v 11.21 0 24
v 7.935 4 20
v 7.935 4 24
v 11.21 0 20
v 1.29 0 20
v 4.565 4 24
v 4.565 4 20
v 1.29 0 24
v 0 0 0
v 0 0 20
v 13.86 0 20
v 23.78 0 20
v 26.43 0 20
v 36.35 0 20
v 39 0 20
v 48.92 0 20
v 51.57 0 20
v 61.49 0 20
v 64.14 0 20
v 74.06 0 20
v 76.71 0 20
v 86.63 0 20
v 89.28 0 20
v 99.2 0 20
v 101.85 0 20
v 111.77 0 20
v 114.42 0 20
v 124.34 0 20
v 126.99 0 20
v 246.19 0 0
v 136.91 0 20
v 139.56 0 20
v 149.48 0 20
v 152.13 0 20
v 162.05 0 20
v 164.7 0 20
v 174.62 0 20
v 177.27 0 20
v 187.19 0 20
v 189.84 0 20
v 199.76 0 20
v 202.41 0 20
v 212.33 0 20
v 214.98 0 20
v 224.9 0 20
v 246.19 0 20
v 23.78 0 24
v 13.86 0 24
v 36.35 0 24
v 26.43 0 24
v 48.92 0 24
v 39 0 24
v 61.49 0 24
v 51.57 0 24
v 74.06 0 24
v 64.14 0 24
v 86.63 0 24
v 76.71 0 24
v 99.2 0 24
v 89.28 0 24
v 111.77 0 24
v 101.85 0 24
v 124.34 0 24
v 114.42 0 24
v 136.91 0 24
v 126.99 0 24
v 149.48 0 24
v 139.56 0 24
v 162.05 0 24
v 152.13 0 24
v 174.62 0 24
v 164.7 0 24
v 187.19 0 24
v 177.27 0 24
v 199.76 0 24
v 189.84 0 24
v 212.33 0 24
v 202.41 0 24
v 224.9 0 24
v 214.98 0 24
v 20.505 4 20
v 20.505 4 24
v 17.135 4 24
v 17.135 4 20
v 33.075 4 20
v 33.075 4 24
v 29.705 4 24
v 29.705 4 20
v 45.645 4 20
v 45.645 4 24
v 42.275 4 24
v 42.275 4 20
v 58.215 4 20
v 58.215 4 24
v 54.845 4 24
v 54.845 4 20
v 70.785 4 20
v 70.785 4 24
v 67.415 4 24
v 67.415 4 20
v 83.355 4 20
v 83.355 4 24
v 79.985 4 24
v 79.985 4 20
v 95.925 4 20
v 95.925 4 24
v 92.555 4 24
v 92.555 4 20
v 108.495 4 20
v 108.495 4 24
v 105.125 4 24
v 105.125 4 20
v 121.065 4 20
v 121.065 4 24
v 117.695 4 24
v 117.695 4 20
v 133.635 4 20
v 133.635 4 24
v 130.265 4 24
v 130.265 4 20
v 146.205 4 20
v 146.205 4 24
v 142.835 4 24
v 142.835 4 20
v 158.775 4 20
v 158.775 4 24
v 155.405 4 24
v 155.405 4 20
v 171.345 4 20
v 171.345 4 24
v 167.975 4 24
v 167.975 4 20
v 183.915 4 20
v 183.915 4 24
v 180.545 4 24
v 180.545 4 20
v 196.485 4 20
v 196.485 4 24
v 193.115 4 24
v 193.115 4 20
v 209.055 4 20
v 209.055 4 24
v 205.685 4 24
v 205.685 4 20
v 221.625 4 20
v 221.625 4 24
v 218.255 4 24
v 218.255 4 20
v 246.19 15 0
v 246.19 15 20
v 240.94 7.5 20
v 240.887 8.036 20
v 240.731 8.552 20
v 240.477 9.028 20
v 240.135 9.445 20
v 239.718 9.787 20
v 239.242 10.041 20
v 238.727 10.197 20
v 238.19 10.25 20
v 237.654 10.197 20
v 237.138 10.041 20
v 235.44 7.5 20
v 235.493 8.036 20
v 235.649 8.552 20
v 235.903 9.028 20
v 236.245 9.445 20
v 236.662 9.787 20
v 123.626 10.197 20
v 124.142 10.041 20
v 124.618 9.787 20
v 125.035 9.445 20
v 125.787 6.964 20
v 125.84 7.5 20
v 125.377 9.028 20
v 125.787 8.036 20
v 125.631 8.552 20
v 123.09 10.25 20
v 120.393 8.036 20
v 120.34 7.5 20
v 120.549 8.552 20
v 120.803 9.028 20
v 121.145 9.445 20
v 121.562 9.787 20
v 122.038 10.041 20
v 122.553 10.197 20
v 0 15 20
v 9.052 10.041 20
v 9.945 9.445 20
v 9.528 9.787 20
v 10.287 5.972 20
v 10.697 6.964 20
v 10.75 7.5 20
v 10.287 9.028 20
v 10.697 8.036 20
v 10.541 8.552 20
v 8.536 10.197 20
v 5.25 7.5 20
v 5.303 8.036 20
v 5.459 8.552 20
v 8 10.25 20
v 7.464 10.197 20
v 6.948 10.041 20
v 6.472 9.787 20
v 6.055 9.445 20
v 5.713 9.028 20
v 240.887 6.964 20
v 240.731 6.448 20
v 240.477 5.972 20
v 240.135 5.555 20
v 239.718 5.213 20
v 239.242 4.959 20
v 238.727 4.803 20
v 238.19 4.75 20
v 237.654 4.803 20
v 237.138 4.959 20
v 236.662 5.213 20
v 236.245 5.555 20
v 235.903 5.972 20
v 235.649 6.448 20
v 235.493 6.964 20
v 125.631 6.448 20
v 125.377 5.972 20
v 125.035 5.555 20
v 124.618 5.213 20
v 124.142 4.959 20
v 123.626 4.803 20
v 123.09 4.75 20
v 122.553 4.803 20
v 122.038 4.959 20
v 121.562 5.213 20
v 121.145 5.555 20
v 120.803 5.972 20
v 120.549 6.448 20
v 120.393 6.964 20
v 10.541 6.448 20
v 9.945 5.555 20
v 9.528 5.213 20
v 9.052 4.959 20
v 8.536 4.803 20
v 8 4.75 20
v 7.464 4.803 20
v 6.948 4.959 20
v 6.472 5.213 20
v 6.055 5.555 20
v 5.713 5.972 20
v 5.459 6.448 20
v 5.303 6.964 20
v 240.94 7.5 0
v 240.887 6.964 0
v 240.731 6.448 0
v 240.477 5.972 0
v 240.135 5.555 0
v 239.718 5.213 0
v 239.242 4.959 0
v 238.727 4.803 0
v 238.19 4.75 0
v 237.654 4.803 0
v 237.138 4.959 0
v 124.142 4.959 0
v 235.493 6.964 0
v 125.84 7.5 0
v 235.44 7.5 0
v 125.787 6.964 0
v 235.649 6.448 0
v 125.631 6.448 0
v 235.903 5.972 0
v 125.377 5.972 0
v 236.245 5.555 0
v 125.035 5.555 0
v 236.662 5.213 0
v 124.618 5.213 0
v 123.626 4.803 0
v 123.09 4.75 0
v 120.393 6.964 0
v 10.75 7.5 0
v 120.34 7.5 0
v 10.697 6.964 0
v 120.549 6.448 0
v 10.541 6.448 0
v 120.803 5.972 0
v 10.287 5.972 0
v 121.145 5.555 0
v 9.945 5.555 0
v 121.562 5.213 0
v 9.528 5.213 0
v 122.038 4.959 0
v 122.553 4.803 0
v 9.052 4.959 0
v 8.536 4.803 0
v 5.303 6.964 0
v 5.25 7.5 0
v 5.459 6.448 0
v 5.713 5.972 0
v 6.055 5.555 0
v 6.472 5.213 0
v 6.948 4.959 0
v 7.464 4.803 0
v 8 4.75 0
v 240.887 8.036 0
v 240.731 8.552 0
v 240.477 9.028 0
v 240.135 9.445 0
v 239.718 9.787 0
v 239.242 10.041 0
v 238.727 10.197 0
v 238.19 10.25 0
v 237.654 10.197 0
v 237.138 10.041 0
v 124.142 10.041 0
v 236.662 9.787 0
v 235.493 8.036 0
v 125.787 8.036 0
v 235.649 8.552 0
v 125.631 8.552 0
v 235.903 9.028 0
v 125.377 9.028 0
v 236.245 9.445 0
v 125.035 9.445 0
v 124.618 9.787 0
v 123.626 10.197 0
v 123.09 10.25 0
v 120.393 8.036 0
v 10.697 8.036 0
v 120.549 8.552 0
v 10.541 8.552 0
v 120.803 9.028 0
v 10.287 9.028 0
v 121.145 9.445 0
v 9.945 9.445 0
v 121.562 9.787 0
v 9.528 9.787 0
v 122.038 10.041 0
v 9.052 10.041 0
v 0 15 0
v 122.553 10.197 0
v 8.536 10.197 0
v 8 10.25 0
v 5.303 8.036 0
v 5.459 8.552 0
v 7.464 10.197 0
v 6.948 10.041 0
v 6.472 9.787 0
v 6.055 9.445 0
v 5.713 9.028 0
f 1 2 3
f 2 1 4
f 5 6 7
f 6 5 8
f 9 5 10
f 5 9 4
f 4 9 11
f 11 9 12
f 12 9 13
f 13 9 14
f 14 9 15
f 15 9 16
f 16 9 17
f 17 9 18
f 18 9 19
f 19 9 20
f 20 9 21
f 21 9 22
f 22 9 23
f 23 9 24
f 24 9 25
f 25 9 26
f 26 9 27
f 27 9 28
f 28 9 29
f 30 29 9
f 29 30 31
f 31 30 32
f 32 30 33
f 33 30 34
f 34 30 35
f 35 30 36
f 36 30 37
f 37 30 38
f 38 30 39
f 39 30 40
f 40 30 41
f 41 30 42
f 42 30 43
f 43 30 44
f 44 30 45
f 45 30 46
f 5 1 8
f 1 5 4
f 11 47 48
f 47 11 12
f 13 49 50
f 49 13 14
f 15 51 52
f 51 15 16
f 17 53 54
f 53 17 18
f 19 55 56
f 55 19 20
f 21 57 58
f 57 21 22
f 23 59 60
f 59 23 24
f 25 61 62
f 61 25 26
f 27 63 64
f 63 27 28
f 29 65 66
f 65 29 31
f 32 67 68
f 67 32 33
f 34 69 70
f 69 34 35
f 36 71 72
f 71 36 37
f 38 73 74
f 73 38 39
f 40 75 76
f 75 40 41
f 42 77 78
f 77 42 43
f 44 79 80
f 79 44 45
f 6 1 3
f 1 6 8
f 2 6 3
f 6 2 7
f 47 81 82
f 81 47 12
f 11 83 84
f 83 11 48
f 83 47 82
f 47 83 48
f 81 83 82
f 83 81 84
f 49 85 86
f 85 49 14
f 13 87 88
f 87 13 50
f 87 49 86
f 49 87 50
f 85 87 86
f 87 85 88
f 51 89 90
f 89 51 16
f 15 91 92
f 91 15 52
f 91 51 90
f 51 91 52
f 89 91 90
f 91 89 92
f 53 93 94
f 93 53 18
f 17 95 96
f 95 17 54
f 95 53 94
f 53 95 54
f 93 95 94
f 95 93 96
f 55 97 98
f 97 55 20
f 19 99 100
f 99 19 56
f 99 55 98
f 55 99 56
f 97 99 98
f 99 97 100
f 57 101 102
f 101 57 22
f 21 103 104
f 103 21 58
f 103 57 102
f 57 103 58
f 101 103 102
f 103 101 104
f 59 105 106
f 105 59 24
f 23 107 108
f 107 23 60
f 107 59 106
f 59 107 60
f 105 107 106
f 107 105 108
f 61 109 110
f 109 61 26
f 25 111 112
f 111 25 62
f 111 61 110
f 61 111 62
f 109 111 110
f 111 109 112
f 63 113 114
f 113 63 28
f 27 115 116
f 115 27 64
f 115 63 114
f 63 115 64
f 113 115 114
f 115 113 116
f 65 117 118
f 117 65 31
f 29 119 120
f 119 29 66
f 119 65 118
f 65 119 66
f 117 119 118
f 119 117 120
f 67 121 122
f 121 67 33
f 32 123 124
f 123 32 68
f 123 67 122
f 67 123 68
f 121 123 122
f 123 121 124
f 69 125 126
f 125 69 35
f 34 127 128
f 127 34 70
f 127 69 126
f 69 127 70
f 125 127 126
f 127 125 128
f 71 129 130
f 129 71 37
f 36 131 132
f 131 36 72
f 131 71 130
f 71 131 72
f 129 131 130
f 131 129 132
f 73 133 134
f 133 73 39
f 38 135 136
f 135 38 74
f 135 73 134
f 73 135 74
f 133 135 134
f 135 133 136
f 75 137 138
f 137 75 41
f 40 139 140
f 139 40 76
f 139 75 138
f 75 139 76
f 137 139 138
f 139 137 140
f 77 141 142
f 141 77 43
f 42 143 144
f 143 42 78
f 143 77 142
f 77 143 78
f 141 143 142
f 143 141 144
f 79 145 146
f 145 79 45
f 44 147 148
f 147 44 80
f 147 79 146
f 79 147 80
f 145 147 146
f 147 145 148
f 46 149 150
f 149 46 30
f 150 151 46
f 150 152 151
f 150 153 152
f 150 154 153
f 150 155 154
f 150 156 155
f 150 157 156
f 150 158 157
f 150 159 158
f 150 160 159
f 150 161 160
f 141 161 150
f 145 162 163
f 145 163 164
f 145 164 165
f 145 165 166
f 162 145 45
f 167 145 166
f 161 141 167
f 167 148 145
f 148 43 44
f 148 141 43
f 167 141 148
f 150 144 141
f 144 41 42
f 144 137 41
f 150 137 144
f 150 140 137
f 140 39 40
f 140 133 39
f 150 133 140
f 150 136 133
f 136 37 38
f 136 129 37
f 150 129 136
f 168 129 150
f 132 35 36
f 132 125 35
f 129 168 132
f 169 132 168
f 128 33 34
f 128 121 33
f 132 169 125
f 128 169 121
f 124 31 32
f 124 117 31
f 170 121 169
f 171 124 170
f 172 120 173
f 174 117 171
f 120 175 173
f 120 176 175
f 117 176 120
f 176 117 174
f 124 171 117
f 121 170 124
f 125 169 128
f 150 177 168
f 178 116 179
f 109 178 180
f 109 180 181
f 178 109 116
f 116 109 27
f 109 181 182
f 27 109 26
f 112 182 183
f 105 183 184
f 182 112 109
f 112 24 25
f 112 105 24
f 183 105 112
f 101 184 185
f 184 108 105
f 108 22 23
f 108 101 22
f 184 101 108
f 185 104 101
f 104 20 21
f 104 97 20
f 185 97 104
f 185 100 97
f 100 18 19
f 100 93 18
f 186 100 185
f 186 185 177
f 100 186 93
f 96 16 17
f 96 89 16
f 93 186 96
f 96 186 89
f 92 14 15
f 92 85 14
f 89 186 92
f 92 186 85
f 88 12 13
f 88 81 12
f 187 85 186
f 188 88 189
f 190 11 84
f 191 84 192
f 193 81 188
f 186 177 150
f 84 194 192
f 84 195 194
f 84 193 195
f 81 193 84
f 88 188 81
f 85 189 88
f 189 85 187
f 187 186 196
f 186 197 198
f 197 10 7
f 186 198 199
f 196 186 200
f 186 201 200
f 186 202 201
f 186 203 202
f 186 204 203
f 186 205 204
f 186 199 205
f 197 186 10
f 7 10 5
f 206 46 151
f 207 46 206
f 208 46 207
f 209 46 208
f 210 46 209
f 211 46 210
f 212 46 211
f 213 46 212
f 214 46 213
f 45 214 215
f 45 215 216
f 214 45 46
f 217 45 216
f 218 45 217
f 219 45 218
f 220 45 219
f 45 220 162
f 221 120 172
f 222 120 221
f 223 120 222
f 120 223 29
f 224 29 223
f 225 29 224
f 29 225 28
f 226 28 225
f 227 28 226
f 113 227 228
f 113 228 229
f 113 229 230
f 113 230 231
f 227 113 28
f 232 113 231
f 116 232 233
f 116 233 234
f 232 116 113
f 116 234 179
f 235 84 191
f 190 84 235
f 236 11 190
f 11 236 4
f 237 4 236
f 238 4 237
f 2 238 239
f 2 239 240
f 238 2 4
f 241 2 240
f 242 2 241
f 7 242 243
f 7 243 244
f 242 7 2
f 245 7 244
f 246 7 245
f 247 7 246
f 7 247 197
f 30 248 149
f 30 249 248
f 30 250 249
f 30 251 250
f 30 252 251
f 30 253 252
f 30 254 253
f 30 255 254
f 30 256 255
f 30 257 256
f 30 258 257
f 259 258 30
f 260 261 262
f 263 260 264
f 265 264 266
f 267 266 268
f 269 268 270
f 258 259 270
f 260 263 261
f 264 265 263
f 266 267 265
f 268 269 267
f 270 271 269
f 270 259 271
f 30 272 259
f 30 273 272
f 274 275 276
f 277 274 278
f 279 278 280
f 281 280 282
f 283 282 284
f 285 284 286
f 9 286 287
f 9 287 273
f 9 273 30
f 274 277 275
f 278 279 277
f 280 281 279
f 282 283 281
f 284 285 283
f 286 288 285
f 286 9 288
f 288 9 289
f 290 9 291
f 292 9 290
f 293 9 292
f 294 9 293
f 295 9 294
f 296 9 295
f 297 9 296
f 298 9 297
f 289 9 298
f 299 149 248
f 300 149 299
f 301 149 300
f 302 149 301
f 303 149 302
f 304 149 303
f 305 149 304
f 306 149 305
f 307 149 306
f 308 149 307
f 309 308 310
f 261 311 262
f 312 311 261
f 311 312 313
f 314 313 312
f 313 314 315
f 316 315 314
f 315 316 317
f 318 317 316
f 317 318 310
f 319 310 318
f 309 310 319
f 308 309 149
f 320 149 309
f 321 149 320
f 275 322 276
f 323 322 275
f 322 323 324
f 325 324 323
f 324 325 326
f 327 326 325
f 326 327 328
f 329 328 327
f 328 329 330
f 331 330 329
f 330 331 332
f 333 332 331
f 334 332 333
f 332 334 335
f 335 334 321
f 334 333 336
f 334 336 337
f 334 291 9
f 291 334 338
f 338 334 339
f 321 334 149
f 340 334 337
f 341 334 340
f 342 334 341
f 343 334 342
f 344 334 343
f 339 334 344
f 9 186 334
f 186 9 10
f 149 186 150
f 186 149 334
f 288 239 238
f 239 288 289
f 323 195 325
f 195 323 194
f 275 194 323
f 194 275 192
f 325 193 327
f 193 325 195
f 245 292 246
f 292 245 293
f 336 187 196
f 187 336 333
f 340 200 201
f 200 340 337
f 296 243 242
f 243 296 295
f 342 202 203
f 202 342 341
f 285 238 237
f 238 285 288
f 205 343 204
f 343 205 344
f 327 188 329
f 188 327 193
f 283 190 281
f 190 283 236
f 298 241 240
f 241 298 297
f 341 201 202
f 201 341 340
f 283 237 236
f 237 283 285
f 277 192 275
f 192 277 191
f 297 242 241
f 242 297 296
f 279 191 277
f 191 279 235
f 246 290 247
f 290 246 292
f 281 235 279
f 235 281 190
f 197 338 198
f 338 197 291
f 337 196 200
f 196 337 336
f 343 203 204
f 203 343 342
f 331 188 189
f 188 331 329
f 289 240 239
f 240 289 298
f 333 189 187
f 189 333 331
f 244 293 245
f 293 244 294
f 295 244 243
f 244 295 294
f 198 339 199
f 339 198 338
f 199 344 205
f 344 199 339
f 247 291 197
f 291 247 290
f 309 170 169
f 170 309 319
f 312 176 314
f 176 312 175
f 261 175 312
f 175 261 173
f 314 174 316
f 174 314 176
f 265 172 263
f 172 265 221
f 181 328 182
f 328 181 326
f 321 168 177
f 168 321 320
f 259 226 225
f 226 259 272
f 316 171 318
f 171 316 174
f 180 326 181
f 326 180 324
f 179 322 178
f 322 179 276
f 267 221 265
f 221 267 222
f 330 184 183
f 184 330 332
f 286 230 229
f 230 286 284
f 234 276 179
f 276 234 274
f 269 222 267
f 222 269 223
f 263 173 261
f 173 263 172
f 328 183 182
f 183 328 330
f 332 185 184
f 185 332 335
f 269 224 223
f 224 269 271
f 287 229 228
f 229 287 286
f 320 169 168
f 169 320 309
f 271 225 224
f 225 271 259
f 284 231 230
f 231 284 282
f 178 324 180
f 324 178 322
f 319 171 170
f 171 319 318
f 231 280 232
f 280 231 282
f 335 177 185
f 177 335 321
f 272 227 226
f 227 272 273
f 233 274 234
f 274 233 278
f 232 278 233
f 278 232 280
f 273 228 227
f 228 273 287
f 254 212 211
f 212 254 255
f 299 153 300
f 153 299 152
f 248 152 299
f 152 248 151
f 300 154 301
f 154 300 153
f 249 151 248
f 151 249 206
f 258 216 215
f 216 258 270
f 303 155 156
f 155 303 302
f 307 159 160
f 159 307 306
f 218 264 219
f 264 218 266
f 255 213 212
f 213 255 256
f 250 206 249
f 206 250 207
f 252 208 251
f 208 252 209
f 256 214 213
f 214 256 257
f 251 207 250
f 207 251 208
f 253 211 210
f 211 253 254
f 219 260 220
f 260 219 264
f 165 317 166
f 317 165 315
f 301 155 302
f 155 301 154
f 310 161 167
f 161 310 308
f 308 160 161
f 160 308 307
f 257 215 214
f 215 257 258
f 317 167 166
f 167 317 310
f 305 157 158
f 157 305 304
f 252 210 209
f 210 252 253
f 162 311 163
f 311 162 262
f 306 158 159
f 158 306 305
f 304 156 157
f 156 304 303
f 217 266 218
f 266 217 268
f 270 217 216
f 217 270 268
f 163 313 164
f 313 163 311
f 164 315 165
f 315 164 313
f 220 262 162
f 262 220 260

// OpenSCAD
$fn = 32;

// ----------------------------------------------------------------------
// Gear rack: m=4 z=18, 246.19 x 15 x 24 mm
// ----------------------------------------------------------------------

// --- parameters (mm) ---
bar_len = 246.19;         // rack length, X
bar_w = 15;               // rack width, Y
bar_h = 24;               // overall height, Z
gear_module = 4;          // module
base_t = 20;              // tooth root line height
pitch = 12.57;            // circular pitch
tip_w = 3.37;             // tooth thickness at the tip
root_w = 9.92;            // tooth thickness at the root line
hole_d = 5.5;             // mounting hole
sink = 0.6;               // tooth root overlap into the body

tooth_span = 226.19;

module tooth(x0) {
  /* 20 deg flank profile, sunk into the body for a positive overlap */
  translate([x0, 0, base_t - sink])
    linear_extrude(height = bar_h - base_t + sink)
      polygon(points = [[-root_w / 2, 0], [root_w / 2, 0],
                        [tip_w / 2, bar_h - base_t],
                        [-tip_w / 2, bar_h - base_t]]);
}

difference() {
  union() {
    cube([bar_len, bar_w, base_t]);
    for (i = [0 : 18 - 1])
      tooth((i + 0.5) * pitch + (tooth_span - 18 * pitch) / 2);
  }
  translate([8, 7.5, -1]) cylinder(h = base_t + 2, d = hole_d);
  translate([123.09, 7.5, -1]) cylinder(h = base_t + 2, d = hole_d);
  translate([238.19, 7.5, -1]) cylinder(h = base_t + 2, d = hole_d);
}
